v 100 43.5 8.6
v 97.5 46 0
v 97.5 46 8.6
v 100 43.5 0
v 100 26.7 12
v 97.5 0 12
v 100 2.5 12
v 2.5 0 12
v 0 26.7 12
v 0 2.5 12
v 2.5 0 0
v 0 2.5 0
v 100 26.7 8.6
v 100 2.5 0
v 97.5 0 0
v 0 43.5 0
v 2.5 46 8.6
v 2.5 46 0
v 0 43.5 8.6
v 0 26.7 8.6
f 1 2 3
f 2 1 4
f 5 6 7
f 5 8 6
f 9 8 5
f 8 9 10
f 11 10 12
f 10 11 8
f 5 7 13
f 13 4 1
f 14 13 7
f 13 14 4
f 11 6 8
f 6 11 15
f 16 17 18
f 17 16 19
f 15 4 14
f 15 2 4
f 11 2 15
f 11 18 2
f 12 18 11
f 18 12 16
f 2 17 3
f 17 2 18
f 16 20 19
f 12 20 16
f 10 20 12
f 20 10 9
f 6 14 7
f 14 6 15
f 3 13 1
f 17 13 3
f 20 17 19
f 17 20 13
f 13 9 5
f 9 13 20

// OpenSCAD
$fn = 32;

// ----------------------------------------------------------------------
// Stepped bar: sidestep, 100 x 46 x 12/8.6 mm
// ----------------------------------------------------------------------

// --- parameters (mm) ---
bar_l = 100;              // bar length, X
bar_w = 46;               // bar width, Y
plate_t = 12;             // thickness of the thick zone, Z
thin_t = 8.6;             // thickness of the thin zone
corner_c = 2.5;           // corner chamfer of the bar
step_cut = 3.4;           // material removed from the thin zone
ledge_y = 26.7;           // start of the ledge from the front edge
depth_1 = 3.4;            // depth of cut 1 from the top face

profile = [[2.5, 0], [97.5, 0], [100, 2.5], [100, 43.5], [97.5, 46], [2.5, 46], [0, 43.5], [0, 2.5]];  // primary outline, 8 points, counter clockwise
void_1 = [[-1, 26.7], [101, 26.7], [101, 47], [-1, 47]];  // ledge cut along one edge, 4 points

// --- the one profile operation ---
difference() {
  linear_extrude(height = plate_t) polygon(points = profile);
  translate([0, 0, plate_t - depth_1])
    linear_extrude(height = depth_1 + 1) polygon(points = void_1);
}
